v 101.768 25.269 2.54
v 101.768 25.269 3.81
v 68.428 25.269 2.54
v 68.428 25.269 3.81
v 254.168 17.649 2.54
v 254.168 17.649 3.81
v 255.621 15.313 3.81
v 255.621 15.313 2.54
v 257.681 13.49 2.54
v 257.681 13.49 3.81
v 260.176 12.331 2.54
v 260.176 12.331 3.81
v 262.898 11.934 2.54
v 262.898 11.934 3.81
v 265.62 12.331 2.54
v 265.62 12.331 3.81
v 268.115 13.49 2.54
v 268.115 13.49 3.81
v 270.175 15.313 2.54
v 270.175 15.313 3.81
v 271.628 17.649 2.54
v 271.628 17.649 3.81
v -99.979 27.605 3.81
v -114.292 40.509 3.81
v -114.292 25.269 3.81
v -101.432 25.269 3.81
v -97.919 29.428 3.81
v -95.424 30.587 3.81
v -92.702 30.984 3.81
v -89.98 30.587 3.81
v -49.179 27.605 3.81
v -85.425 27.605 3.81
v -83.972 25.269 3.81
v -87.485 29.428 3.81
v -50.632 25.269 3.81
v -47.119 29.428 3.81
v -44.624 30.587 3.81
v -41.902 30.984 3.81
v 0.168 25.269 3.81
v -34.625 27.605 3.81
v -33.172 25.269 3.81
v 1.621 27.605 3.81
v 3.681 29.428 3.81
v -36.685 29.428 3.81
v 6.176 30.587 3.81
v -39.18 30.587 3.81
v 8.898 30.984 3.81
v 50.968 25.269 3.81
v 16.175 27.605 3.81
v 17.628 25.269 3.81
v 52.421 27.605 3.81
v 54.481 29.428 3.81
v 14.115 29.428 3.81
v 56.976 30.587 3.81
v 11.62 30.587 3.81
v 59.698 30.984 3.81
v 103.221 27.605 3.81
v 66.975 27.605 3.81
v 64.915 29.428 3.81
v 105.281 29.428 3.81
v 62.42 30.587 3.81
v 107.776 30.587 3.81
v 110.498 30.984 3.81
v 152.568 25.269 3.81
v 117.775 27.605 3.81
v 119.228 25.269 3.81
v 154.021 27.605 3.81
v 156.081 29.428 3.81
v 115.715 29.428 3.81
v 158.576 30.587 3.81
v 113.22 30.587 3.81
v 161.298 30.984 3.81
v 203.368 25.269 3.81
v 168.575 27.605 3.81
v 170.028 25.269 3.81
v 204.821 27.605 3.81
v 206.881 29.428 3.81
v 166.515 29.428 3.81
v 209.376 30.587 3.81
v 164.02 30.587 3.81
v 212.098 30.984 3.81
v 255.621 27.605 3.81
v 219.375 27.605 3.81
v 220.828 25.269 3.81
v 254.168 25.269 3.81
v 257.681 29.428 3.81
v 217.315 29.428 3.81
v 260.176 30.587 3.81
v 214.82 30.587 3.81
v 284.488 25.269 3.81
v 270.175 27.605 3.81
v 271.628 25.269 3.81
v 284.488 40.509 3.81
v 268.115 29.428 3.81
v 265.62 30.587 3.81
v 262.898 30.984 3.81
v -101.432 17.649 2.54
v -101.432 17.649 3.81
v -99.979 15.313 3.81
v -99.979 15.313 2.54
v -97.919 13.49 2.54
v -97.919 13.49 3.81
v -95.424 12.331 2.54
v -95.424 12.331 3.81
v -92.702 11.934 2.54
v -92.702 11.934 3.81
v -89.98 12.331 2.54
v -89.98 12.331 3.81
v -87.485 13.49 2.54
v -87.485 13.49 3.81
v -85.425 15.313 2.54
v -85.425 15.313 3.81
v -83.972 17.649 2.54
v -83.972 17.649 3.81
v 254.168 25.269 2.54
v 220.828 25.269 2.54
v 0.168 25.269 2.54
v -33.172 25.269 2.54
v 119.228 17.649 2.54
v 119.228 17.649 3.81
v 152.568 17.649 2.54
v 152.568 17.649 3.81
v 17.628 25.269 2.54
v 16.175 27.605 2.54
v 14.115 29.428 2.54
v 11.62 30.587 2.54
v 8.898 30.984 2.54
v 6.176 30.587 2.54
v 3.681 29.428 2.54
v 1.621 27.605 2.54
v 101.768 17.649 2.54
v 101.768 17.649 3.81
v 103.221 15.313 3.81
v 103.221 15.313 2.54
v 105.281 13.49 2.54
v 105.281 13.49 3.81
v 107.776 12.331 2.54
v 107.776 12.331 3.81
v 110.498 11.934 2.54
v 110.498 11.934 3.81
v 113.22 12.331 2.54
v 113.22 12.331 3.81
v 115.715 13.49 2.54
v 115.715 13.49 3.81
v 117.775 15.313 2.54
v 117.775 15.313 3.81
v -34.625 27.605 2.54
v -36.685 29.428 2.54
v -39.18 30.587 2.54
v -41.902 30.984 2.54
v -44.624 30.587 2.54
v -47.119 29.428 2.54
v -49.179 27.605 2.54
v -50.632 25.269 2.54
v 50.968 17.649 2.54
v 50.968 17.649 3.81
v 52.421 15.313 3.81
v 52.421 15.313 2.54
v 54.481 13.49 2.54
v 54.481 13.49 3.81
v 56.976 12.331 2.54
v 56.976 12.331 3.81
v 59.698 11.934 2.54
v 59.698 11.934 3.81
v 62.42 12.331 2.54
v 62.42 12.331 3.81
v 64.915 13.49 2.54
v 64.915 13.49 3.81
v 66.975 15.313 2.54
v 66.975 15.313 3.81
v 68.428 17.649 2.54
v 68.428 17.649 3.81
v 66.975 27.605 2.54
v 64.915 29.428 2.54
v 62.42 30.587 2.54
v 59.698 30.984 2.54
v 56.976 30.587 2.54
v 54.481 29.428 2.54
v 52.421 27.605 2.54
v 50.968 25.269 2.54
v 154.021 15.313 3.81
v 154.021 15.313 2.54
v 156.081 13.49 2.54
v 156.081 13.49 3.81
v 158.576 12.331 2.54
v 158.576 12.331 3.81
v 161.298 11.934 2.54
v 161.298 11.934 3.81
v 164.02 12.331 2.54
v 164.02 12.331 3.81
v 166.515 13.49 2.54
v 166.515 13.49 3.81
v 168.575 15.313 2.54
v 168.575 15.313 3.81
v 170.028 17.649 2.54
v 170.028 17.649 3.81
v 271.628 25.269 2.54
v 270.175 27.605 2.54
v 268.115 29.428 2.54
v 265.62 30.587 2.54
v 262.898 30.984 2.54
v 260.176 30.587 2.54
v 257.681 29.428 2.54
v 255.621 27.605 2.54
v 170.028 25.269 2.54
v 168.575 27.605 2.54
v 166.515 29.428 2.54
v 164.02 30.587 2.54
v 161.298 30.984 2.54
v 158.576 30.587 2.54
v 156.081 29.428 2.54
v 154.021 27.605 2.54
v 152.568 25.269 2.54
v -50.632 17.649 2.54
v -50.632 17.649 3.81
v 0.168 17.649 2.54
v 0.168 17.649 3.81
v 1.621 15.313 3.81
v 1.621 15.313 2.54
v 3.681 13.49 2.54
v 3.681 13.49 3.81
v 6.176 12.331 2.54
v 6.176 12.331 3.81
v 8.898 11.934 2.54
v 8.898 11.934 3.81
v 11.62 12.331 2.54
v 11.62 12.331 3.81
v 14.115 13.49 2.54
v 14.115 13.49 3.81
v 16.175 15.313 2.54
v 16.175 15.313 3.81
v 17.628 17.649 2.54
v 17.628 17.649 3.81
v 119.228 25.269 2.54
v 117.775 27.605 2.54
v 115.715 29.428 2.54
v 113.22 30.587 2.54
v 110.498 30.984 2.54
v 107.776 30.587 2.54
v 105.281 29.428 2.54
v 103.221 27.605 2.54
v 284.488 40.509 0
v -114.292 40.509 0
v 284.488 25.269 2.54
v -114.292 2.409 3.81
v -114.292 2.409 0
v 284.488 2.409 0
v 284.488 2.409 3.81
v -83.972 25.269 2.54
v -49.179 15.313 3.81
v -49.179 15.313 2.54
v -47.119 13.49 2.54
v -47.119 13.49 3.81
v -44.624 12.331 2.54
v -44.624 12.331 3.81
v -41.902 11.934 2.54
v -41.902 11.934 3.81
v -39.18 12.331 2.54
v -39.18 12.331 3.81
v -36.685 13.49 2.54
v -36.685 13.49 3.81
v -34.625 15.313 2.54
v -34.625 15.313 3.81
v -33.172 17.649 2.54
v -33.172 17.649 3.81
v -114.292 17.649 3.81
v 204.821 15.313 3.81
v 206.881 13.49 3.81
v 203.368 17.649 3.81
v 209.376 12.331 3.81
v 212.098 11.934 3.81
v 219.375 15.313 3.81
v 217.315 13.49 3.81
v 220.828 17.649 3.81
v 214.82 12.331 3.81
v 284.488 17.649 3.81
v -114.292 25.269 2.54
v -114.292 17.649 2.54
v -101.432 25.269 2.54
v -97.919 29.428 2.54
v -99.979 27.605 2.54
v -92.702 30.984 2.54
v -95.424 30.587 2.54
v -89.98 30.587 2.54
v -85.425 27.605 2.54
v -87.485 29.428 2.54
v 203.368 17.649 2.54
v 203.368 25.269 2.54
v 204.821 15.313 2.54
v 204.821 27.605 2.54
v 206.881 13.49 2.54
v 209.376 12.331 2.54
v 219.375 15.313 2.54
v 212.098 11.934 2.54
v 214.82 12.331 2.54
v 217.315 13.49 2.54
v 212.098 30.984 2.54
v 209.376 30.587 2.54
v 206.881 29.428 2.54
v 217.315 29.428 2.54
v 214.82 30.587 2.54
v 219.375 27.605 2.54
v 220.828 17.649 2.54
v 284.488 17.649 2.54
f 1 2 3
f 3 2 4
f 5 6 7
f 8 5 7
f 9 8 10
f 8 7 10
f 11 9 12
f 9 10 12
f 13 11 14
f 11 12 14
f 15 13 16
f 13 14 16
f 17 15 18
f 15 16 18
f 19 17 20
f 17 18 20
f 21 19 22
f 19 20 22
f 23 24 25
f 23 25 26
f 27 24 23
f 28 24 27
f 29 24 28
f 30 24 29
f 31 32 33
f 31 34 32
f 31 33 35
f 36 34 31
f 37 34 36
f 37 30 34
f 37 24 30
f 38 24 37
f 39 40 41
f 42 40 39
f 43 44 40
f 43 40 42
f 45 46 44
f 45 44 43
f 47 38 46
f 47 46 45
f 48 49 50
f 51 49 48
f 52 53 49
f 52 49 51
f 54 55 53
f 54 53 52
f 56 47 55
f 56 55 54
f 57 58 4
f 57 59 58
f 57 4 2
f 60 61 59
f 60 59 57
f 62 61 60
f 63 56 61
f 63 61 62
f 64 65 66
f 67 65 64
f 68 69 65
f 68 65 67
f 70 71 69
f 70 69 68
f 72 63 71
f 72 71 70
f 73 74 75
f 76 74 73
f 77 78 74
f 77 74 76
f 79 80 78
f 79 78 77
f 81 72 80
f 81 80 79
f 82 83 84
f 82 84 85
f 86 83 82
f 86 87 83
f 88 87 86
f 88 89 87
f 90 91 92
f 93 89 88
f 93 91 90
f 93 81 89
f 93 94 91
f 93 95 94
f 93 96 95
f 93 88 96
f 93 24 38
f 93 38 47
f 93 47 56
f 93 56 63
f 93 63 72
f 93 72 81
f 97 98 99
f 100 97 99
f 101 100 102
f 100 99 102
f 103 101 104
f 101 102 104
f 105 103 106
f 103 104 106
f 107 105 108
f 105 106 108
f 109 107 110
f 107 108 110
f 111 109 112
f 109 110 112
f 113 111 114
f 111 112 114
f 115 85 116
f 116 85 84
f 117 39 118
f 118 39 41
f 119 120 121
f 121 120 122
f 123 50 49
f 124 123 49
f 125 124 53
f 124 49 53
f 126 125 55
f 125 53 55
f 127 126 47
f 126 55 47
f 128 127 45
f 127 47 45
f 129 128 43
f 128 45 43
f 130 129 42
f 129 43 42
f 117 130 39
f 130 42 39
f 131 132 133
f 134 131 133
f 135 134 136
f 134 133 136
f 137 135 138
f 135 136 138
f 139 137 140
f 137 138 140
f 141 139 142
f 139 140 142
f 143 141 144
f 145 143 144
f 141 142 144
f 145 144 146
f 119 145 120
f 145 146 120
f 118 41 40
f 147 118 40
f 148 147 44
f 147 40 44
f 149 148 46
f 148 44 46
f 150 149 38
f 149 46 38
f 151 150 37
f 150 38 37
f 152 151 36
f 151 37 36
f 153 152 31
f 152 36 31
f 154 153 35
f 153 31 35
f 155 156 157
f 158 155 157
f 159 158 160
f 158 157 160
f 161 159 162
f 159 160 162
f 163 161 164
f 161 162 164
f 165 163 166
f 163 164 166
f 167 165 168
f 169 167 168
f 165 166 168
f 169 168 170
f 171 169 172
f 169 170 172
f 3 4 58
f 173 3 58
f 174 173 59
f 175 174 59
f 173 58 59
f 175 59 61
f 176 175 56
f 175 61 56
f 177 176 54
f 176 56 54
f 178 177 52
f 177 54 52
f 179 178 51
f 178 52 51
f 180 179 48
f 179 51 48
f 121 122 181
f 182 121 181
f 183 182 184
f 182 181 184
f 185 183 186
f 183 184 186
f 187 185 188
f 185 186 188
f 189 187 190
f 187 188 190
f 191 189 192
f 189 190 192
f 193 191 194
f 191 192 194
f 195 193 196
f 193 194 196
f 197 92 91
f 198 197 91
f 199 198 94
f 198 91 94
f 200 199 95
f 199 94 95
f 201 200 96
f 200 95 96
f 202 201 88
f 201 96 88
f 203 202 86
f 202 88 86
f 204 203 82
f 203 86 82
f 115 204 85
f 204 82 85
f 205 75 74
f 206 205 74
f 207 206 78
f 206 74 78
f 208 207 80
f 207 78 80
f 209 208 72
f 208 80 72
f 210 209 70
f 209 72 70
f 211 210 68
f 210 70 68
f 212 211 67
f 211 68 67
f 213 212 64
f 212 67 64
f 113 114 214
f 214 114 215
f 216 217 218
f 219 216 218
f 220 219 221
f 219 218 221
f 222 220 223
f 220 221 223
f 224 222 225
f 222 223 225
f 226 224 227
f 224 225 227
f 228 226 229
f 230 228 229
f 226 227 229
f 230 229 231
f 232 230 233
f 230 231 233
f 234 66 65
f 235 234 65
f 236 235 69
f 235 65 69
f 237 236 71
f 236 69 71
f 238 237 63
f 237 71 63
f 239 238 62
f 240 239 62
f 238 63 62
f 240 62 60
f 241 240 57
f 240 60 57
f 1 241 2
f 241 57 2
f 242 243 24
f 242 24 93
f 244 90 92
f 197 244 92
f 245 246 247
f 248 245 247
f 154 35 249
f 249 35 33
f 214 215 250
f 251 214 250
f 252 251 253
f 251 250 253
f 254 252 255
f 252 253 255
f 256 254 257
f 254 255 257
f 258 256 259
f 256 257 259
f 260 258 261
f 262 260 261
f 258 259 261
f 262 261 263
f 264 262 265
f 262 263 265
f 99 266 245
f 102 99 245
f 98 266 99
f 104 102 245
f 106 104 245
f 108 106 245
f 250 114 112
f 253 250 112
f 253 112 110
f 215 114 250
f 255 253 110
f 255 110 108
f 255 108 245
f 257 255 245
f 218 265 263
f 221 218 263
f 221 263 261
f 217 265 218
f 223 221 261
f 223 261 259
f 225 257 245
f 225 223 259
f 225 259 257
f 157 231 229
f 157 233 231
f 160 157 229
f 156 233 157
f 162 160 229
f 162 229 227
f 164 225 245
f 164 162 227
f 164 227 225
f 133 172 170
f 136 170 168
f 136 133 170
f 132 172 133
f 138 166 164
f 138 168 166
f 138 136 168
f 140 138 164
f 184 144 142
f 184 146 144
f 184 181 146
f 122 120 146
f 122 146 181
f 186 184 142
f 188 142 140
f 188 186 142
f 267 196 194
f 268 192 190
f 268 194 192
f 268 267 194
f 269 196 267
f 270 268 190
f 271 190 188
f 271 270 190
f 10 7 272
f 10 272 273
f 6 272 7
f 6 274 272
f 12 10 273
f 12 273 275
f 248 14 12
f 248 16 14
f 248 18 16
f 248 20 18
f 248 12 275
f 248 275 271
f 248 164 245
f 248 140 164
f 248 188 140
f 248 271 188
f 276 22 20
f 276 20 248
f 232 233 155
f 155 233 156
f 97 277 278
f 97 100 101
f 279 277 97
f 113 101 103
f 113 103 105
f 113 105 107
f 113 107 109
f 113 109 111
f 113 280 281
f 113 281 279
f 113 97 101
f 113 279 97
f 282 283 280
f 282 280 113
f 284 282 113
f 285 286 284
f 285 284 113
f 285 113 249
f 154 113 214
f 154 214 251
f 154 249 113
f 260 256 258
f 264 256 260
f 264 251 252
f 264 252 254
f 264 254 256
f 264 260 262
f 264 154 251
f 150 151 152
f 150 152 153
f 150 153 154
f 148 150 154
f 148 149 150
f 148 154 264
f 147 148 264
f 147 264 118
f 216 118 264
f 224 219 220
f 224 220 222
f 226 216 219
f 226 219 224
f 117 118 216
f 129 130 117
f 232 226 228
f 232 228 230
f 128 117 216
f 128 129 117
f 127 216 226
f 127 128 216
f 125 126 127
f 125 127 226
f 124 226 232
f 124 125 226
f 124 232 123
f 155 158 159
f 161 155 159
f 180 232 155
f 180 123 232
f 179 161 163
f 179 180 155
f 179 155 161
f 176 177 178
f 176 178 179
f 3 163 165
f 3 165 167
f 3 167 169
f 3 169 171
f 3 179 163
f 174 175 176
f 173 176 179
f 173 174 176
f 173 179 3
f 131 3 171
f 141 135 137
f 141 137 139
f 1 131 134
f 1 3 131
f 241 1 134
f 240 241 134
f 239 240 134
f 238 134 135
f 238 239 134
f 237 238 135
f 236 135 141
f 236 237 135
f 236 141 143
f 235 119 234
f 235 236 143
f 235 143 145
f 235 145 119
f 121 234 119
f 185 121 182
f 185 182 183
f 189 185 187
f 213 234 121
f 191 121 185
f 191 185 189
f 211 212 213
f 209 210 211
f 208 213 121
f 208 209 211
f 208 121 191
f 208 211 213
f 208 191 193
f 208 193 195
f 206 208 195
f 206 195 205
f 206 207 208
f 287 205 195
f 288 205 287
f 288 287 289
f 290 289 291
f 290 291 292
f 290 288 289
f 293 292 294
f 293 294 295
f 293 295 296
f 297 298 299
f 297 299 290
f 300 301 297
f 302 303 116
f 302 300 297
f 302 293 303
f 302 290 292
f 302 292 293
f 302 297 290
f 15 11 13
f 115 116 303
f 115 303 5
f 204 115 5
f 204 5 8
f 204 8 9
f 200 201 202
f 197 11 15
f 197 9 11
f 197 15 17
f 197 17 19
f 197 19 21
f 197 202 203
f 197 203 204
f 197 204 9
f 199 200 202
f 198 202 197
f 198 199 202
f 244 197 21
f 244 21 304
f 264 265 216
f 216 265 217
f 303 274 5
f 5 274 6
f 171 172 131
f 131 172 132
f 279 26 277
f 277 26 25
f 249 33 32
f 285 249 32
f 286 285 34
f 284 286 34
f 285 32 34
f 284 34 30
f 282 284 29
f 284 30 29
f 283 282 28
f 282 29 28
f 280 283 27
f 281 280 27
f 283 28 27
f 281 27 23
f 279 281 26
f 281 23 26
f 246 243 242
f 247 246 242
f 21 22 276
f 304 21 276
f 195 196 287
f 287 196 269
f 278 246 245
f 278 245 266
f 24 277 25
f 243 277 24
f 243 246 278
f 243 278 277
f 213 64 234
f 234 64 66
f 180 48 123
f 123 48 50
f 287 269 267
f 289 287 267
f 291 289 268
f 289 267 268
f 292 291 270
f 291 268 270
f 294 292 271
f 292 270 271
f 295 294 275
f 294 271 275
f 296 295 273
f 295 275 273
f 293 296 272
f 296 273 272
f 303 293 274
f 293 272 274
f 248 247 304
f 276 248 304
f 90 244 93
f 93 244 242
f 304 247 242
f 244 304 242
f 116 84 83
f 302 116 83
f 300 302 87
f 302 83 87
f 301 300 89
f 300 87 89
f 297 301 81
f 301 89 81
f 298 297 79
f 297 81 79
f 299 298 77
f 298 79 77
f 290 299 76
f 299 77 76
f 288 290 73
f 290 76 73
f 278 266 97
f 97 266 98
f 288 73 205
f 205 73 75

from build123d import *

# Parameters (mm, degrees)
F0_W     = 398.78
F0_H     = 38.1
F1_DEPTH = 3.81
F2_R     = 9.525
F3_DEPTH = 1.27
F5_DEPTH = 1.27


with BuildPart() as f1:
    # F0 (on Top) → F1 (new body)
    with BuildSketch(Plane.XY):
        with Locations((85.0978558012, 21.4591654949)):
            Rectangle(F0_W, F0_H)
    extrude(amount=F1_DEPTH)

    # F2 (on face) → F3 (cut)
    with BuildSketch(Plane.XY.offset(3.81)):
        with Locations((-92.7021441988, 21.4591654949)):
            Circle(F2_R)
        with Locations((-41.9021441988, 21.4591654949)):
            Circle(F2_R)
        with Locations((8.8978558012, 21.4591654949)):
            Circle(F2_R)
        with Locations((59.6978558012, 21.4591654949)):
            Circle(F2_R)
        with Locations((110.4978558012, 21.4591654949)):
            Circle(F2_R)
        with Locations((161.2978558012, 21.4591654949)):
            Circle(F2_R)
        with Locations((212.0978558012, 21.4591654949)):
            Circle(F2_R)
        with Locations((262.8978558012, 21.4591654949)):
            Circle(F2_R)
    extrude(amount=-F3_DEPTH, mode=Mode.SUBTRACT)

    # F4 (on face) → F5 (cut)
    with BuildSketch(Plane.XY.offset(3.81)):
        with BuildLine():
            Line((-101.4319508977, 25.2691654949), (-114.2921441988, 25.2691654949))
            Line((-114.2921441988, 25.2691654949), (-114.2921441988, 17.6491654949))
            Line((-114.2921441988, 17.6491654949), (-101.4319508977, 17.6491654949))
            ThreePointArc((-101.4319508977, 17.6491654949), (-102.2271441988, 21.4591654949), (-101.4319508977, 25.2691654949))
        make_face()
        with BuildLine():
            Line((-83.9723374999, 25.2691654949), (-101.4319508977, 25.2691654949))
            ThreePointArc((-101.4319508977, 25.2691654949), (-102.2271441988, 21.4591654949), (-101.4319508977, 17.6491654949))
            Line((-101.4319508977, 17.6491654949), (-83.9723374999, 17.6491654949))
            ThreePointArc((-83.9723374999, 17.6491654949), (-83.3780615681, 19.5131161387), (-83.1771441988, 21.4591654949))
            ThreePointArc((-83.1771441988, 21.4591654949), (-83.3780615681, 23.405214851), (-83.9723374999, 25.2691654949))
        make_face()
        with BuildLine():
            Line((-50.6319508977, 25.2691654949), (-83.9723374999, 25.2691654949))
            ThreePointArc((-83.9723374999, 25.2691654949), (-83.3780615681, 23.405214851), (-83.1771441988, 21.4591654949))
            ThreePointArc((-83.1771441988, 21.4591654949), (-83.3780615681, 19.5131161387), (-83.9723374999, 17.6491654949))
            Line((-83.9723374999, 17.6491654949), (-50.6319508977, 17.6491654949))
            ThreePointArc((-50.6319508977, 17.6491654949), (-51.4271441988, 21.4591654949), (-50.6319508977, 25.2691654949))
        make_face()
        with BuildLine():
            Line((-33.1723374999, 25.2691654949), (-50.6319508977, 25.2691654949))
            ThreePointArc((-50.6319508977, 25.2691654949), (-51.4271441988, 21.4591654949), (-50.6319508977, 17.6491654949))
            Line((-50.6319508977, 17.6491654949), (-33.1723374999, 17.6491654949))
            ThreePointArc((-33.1723374999, 17.6491654949), (-32.5780615681, 19.5131161387), (-32.3771441988, 21.4591654949))
            ThreePointArc((-32.3771441988, 21.4591654949), (-32.5780615681, 23.405214851), (-33.1723374999, 25.2691654949))
        make_face()
        with BuildLine():
            Line((284.4878558012, 17.6491654949), (284.4878558012, 25.2691654949))
            Line((284.4878558012, 25.2691654949), (271.6276625001, 25.2691654949))
            ThreePointArc((271.6276625001, 25.2691654949), (272.2219384319, 23.405214851), (272.4228558012, 21.4591654949))
            ThreePointArc((272.4228558012, 21.4591654949), (272.2219384319, 19.5131161387), (271.6276625001, 17.6491654949))
            Line((271.6276625001, 17.6491654949), (284.4878558012, 17.6491654949))
        make_face()
        with BuildLine():
            Line((0.1680491023, 25.2691654949), (-33.1723374999, 25.2691654949))
            ThreePointArc((-33.1723374999, 25.2691654949), (-32.5780615681, 23.405214851), (-32.3771441988, 21.4591654949))
            ThreePointArc((-32.3771441988, 21.4591654949), (-32.5780615681, 19.5131161387), (-33.1723374999, 17.6491654949))
            Line((-33.1723374999, 17.6491654949), (0.1680491023, 17.6491654949))
            ThreePointArc((0.1680491023, 17.6491654949), (-0.6271441988, 21.4591654949), (0.1680491023, 25.2691654949))
        make_face()
        with BuildLine():
            Line((17.6276625001, 25.2691654949), (0.1680491023, 25.2691654949))
            ThreePointArc((0.1680491023, 25.2691654949), (-0.6271441988, 21.4591654949), (0.1680491023, 17.6491654949))
            Line((0.1680491023, 17.6491654949), (17.6276625001, 17.6491654949))
            ThreePointArc((17.6276625001, 17.6491654949), (18.2219384319, 19.5131161387), (18.4228558012, 21.4591654949))
            ThreePointArc((18.4228558012, 21.4591654949), (18.2219384319, 23.405214851), (17.6276625001, 25.2691654949))
        make_face()
        with BuildLine():
            ThreePointArc((254.1680491023, 17.6491654949), (253.3728558012, 21.4591654949), (254.1680491023, 25.2691654949))
            Line((254.1680491023, 25.2691654949), (220.8276625001, 25.2691654949))
            ThreePointArc((220.8276625001, 25.2691654949), (221.4219384319, 23.405214851), (221.6228558012, 21.4591654949))
            ThreePointArc((221.6228558012, 21.4591654949), (221.4219384319, 19.5131161387), (220.8276625001, 17.6491654949))
            Line((220.8276625001, 17.6491654949), (254.1680491023, 17.6491654949))
        make_face()
        with BuildLine():
            Line((50.9680491023, 25.2691654949), (17.6276625001, 25.2691654949))
            ThreePointArc((17.6276625001, 25.2691654949), (18.2219384319, 23.405214851), (18.4228558012, 21.4591654949))
            ThreePointArc((18.4228558012, 21.4591654949), (18.2219384319, 19.5131161387), (17.6276625001, 17.6491654949))
            Line((17.6276625001, 17.6491654949), (50.9680491023, 17.6491654949))
            ThreePointArc((50.9680491023, 17.6491654949), (50.1728558012, 21.4591654949), (50.9680491023, 25.2691654949))
        make_face()
        with BuildLine():
            ThreePointArc((221.6228558012, 21.4591654949), (221.4219384319, 23.405214851), (220.8276625001, 25.2691654949))
            Line((220.8276625001, 25.2691654949), (203.3680491023, 25.2691654949))
            ThreePointArc((203.3680491023, 25.2691654949), (202.5728558012, 21.4591654949), (203.3680491023, 17.6491654949))
            Line((203.3680491023, 17.6491654949), (220.8276625001, 17.6491654949))
            ThreePointArc((220.8276625001, 17.6491654949), (221.4219384319, 19.5131161387), (221.6228558012, 21.4591654949))
        make_face()
        with BuildLine():
            Line((68.4276625001, 25.2691654949), (50.9680491023, 25.2691654949))
            ThreePointArc((50.9680491023, 25.2691654949), (50.1728558012, 21.4591654949), (50.9680491023, 17.6491654949))
            Line((50.9680491023, 17.6491654949), (68.4276625001, 17.6491654949))
            ThreePointArc((68.4276625001, 17.6491654949), (69.0219384319, 19.5131161387), (69.2228558012, 21.4591654949))
            ThreePointArc((69.2228558012, 21.4591654949), (69.0219384319, 23.405214851), (68.4276625001, 25.2691654949))
        make_face()
        with BuildLine():
            ThreePointArc((203.3680491023, 17.6491654949), (202.5728558012, 21.4591654949), (203.3680491023, 25.2691654949))
            Line((203.3680491023, 25.2691654949), (170.0276625001, 25.2691654949))
            ThreePointArc((170.0276625001, 25.2691654949), (170.6219384319, 23.405214851), (170.8228558012, 21.4591654949))
            ThreePointArc((170.8228558012, 21.4591654949), (170.6219384319, 19.5131161387), (170.0276625001, 17.6491654949))
            Line((170.0276625001, 17.6491654949), (203.3680491023, 17.6491654949))
        make_face()
        with BuildLine():
            Line((101.7680491023, 25.2691654949), (68.4276625001, 25.2691654949))
            ThreePointArc((68.4276625001, 25.2691654949), (69.0219384319, 23.405214851), (69.2228558012, 21.4591654949))
            ThreePointArc((69.2228558012, 21.4591654949), (69.0219384319, 19.5131161387), (68.4276625001, 17.6491654949))
            Line((68.4276625001, 17.6491654949), (101.7680491023, 17.6491654949))
            ThreePointArc((101.7680491023, 17.6491654949), (100.9728558012, 21.4591654949), (101.7680491023, 25.2691654949))
        make_face()
        with BuildLine():
            ThreePointArc((170.8228558012, 21.4591654949), (170.6219384319, 23.405214851), (170.0276625001, 25.2691654949))
            Line((170.0276625001, 25.2691654949), (152.5680491023, 25.2691654949))
            ThreePointArc((152.5680491023, 25.2691654949), (151.7728558012, 21.4591654949), (152.5680491023, 17.6491654949))
            Line((152.5680491023, 17.6491654949), (170.0276625001, 17.6491654949))
            ThreePointArc((170.0276625001, 17.6491654949), (170.6219384319, 19.5131161387), (170.8228558012, 21.4591654949))
        make_face()
        with BuildLine():
            Line((119.2276625001, 25.2691654949), (101.7680491023, 25.2691654949))
            ThreePointArc((101.7680491023, 25.2691654949), (100.9728558012, 21.4591654949), (101.7680491023, 17.6491654949))
            Line((101.7680491023, 17.6491654949), (119.2276625001, 17.6491654949))
            ThreePointArc((119.2276625001, 17.6491654949), (119.8219384319, 19.5131161387), (120.0228558012, 21.4591654949))
            ThreePointArc((120.0228558012, 21.4591654949), (119.8219384319, 23.405214851), (119.2276625001, 25.2691654949))
        make_face()
        with BuildLine():
            ThreePointArc((152.5680491023, 17.6491654949), (151.7728558012, 21.4591654949), (152.5680491023, 25.2691654949))
            Line((152.5680491023, 25.2691654949), (119.2276625001, 25.2691654949))
            ThreePointArc((119.2276625001, 25.2691654949), (119.8219384319, 23.405214851), (120.0228558012, 21.4591654949))
            ThreePointArc((120.0228558012, 21.4591654949), (119.8219384319, 19.5131161387), (119.2276625001, 17.6491654949))
            Line((119.2276625001, 17.6491654949), (152.5680491023, 17.6491654949))
        make_face()
    extrude(amount=-F5_DEPTH, mode=Mode.SUBTRACT)


solid = f1.part
